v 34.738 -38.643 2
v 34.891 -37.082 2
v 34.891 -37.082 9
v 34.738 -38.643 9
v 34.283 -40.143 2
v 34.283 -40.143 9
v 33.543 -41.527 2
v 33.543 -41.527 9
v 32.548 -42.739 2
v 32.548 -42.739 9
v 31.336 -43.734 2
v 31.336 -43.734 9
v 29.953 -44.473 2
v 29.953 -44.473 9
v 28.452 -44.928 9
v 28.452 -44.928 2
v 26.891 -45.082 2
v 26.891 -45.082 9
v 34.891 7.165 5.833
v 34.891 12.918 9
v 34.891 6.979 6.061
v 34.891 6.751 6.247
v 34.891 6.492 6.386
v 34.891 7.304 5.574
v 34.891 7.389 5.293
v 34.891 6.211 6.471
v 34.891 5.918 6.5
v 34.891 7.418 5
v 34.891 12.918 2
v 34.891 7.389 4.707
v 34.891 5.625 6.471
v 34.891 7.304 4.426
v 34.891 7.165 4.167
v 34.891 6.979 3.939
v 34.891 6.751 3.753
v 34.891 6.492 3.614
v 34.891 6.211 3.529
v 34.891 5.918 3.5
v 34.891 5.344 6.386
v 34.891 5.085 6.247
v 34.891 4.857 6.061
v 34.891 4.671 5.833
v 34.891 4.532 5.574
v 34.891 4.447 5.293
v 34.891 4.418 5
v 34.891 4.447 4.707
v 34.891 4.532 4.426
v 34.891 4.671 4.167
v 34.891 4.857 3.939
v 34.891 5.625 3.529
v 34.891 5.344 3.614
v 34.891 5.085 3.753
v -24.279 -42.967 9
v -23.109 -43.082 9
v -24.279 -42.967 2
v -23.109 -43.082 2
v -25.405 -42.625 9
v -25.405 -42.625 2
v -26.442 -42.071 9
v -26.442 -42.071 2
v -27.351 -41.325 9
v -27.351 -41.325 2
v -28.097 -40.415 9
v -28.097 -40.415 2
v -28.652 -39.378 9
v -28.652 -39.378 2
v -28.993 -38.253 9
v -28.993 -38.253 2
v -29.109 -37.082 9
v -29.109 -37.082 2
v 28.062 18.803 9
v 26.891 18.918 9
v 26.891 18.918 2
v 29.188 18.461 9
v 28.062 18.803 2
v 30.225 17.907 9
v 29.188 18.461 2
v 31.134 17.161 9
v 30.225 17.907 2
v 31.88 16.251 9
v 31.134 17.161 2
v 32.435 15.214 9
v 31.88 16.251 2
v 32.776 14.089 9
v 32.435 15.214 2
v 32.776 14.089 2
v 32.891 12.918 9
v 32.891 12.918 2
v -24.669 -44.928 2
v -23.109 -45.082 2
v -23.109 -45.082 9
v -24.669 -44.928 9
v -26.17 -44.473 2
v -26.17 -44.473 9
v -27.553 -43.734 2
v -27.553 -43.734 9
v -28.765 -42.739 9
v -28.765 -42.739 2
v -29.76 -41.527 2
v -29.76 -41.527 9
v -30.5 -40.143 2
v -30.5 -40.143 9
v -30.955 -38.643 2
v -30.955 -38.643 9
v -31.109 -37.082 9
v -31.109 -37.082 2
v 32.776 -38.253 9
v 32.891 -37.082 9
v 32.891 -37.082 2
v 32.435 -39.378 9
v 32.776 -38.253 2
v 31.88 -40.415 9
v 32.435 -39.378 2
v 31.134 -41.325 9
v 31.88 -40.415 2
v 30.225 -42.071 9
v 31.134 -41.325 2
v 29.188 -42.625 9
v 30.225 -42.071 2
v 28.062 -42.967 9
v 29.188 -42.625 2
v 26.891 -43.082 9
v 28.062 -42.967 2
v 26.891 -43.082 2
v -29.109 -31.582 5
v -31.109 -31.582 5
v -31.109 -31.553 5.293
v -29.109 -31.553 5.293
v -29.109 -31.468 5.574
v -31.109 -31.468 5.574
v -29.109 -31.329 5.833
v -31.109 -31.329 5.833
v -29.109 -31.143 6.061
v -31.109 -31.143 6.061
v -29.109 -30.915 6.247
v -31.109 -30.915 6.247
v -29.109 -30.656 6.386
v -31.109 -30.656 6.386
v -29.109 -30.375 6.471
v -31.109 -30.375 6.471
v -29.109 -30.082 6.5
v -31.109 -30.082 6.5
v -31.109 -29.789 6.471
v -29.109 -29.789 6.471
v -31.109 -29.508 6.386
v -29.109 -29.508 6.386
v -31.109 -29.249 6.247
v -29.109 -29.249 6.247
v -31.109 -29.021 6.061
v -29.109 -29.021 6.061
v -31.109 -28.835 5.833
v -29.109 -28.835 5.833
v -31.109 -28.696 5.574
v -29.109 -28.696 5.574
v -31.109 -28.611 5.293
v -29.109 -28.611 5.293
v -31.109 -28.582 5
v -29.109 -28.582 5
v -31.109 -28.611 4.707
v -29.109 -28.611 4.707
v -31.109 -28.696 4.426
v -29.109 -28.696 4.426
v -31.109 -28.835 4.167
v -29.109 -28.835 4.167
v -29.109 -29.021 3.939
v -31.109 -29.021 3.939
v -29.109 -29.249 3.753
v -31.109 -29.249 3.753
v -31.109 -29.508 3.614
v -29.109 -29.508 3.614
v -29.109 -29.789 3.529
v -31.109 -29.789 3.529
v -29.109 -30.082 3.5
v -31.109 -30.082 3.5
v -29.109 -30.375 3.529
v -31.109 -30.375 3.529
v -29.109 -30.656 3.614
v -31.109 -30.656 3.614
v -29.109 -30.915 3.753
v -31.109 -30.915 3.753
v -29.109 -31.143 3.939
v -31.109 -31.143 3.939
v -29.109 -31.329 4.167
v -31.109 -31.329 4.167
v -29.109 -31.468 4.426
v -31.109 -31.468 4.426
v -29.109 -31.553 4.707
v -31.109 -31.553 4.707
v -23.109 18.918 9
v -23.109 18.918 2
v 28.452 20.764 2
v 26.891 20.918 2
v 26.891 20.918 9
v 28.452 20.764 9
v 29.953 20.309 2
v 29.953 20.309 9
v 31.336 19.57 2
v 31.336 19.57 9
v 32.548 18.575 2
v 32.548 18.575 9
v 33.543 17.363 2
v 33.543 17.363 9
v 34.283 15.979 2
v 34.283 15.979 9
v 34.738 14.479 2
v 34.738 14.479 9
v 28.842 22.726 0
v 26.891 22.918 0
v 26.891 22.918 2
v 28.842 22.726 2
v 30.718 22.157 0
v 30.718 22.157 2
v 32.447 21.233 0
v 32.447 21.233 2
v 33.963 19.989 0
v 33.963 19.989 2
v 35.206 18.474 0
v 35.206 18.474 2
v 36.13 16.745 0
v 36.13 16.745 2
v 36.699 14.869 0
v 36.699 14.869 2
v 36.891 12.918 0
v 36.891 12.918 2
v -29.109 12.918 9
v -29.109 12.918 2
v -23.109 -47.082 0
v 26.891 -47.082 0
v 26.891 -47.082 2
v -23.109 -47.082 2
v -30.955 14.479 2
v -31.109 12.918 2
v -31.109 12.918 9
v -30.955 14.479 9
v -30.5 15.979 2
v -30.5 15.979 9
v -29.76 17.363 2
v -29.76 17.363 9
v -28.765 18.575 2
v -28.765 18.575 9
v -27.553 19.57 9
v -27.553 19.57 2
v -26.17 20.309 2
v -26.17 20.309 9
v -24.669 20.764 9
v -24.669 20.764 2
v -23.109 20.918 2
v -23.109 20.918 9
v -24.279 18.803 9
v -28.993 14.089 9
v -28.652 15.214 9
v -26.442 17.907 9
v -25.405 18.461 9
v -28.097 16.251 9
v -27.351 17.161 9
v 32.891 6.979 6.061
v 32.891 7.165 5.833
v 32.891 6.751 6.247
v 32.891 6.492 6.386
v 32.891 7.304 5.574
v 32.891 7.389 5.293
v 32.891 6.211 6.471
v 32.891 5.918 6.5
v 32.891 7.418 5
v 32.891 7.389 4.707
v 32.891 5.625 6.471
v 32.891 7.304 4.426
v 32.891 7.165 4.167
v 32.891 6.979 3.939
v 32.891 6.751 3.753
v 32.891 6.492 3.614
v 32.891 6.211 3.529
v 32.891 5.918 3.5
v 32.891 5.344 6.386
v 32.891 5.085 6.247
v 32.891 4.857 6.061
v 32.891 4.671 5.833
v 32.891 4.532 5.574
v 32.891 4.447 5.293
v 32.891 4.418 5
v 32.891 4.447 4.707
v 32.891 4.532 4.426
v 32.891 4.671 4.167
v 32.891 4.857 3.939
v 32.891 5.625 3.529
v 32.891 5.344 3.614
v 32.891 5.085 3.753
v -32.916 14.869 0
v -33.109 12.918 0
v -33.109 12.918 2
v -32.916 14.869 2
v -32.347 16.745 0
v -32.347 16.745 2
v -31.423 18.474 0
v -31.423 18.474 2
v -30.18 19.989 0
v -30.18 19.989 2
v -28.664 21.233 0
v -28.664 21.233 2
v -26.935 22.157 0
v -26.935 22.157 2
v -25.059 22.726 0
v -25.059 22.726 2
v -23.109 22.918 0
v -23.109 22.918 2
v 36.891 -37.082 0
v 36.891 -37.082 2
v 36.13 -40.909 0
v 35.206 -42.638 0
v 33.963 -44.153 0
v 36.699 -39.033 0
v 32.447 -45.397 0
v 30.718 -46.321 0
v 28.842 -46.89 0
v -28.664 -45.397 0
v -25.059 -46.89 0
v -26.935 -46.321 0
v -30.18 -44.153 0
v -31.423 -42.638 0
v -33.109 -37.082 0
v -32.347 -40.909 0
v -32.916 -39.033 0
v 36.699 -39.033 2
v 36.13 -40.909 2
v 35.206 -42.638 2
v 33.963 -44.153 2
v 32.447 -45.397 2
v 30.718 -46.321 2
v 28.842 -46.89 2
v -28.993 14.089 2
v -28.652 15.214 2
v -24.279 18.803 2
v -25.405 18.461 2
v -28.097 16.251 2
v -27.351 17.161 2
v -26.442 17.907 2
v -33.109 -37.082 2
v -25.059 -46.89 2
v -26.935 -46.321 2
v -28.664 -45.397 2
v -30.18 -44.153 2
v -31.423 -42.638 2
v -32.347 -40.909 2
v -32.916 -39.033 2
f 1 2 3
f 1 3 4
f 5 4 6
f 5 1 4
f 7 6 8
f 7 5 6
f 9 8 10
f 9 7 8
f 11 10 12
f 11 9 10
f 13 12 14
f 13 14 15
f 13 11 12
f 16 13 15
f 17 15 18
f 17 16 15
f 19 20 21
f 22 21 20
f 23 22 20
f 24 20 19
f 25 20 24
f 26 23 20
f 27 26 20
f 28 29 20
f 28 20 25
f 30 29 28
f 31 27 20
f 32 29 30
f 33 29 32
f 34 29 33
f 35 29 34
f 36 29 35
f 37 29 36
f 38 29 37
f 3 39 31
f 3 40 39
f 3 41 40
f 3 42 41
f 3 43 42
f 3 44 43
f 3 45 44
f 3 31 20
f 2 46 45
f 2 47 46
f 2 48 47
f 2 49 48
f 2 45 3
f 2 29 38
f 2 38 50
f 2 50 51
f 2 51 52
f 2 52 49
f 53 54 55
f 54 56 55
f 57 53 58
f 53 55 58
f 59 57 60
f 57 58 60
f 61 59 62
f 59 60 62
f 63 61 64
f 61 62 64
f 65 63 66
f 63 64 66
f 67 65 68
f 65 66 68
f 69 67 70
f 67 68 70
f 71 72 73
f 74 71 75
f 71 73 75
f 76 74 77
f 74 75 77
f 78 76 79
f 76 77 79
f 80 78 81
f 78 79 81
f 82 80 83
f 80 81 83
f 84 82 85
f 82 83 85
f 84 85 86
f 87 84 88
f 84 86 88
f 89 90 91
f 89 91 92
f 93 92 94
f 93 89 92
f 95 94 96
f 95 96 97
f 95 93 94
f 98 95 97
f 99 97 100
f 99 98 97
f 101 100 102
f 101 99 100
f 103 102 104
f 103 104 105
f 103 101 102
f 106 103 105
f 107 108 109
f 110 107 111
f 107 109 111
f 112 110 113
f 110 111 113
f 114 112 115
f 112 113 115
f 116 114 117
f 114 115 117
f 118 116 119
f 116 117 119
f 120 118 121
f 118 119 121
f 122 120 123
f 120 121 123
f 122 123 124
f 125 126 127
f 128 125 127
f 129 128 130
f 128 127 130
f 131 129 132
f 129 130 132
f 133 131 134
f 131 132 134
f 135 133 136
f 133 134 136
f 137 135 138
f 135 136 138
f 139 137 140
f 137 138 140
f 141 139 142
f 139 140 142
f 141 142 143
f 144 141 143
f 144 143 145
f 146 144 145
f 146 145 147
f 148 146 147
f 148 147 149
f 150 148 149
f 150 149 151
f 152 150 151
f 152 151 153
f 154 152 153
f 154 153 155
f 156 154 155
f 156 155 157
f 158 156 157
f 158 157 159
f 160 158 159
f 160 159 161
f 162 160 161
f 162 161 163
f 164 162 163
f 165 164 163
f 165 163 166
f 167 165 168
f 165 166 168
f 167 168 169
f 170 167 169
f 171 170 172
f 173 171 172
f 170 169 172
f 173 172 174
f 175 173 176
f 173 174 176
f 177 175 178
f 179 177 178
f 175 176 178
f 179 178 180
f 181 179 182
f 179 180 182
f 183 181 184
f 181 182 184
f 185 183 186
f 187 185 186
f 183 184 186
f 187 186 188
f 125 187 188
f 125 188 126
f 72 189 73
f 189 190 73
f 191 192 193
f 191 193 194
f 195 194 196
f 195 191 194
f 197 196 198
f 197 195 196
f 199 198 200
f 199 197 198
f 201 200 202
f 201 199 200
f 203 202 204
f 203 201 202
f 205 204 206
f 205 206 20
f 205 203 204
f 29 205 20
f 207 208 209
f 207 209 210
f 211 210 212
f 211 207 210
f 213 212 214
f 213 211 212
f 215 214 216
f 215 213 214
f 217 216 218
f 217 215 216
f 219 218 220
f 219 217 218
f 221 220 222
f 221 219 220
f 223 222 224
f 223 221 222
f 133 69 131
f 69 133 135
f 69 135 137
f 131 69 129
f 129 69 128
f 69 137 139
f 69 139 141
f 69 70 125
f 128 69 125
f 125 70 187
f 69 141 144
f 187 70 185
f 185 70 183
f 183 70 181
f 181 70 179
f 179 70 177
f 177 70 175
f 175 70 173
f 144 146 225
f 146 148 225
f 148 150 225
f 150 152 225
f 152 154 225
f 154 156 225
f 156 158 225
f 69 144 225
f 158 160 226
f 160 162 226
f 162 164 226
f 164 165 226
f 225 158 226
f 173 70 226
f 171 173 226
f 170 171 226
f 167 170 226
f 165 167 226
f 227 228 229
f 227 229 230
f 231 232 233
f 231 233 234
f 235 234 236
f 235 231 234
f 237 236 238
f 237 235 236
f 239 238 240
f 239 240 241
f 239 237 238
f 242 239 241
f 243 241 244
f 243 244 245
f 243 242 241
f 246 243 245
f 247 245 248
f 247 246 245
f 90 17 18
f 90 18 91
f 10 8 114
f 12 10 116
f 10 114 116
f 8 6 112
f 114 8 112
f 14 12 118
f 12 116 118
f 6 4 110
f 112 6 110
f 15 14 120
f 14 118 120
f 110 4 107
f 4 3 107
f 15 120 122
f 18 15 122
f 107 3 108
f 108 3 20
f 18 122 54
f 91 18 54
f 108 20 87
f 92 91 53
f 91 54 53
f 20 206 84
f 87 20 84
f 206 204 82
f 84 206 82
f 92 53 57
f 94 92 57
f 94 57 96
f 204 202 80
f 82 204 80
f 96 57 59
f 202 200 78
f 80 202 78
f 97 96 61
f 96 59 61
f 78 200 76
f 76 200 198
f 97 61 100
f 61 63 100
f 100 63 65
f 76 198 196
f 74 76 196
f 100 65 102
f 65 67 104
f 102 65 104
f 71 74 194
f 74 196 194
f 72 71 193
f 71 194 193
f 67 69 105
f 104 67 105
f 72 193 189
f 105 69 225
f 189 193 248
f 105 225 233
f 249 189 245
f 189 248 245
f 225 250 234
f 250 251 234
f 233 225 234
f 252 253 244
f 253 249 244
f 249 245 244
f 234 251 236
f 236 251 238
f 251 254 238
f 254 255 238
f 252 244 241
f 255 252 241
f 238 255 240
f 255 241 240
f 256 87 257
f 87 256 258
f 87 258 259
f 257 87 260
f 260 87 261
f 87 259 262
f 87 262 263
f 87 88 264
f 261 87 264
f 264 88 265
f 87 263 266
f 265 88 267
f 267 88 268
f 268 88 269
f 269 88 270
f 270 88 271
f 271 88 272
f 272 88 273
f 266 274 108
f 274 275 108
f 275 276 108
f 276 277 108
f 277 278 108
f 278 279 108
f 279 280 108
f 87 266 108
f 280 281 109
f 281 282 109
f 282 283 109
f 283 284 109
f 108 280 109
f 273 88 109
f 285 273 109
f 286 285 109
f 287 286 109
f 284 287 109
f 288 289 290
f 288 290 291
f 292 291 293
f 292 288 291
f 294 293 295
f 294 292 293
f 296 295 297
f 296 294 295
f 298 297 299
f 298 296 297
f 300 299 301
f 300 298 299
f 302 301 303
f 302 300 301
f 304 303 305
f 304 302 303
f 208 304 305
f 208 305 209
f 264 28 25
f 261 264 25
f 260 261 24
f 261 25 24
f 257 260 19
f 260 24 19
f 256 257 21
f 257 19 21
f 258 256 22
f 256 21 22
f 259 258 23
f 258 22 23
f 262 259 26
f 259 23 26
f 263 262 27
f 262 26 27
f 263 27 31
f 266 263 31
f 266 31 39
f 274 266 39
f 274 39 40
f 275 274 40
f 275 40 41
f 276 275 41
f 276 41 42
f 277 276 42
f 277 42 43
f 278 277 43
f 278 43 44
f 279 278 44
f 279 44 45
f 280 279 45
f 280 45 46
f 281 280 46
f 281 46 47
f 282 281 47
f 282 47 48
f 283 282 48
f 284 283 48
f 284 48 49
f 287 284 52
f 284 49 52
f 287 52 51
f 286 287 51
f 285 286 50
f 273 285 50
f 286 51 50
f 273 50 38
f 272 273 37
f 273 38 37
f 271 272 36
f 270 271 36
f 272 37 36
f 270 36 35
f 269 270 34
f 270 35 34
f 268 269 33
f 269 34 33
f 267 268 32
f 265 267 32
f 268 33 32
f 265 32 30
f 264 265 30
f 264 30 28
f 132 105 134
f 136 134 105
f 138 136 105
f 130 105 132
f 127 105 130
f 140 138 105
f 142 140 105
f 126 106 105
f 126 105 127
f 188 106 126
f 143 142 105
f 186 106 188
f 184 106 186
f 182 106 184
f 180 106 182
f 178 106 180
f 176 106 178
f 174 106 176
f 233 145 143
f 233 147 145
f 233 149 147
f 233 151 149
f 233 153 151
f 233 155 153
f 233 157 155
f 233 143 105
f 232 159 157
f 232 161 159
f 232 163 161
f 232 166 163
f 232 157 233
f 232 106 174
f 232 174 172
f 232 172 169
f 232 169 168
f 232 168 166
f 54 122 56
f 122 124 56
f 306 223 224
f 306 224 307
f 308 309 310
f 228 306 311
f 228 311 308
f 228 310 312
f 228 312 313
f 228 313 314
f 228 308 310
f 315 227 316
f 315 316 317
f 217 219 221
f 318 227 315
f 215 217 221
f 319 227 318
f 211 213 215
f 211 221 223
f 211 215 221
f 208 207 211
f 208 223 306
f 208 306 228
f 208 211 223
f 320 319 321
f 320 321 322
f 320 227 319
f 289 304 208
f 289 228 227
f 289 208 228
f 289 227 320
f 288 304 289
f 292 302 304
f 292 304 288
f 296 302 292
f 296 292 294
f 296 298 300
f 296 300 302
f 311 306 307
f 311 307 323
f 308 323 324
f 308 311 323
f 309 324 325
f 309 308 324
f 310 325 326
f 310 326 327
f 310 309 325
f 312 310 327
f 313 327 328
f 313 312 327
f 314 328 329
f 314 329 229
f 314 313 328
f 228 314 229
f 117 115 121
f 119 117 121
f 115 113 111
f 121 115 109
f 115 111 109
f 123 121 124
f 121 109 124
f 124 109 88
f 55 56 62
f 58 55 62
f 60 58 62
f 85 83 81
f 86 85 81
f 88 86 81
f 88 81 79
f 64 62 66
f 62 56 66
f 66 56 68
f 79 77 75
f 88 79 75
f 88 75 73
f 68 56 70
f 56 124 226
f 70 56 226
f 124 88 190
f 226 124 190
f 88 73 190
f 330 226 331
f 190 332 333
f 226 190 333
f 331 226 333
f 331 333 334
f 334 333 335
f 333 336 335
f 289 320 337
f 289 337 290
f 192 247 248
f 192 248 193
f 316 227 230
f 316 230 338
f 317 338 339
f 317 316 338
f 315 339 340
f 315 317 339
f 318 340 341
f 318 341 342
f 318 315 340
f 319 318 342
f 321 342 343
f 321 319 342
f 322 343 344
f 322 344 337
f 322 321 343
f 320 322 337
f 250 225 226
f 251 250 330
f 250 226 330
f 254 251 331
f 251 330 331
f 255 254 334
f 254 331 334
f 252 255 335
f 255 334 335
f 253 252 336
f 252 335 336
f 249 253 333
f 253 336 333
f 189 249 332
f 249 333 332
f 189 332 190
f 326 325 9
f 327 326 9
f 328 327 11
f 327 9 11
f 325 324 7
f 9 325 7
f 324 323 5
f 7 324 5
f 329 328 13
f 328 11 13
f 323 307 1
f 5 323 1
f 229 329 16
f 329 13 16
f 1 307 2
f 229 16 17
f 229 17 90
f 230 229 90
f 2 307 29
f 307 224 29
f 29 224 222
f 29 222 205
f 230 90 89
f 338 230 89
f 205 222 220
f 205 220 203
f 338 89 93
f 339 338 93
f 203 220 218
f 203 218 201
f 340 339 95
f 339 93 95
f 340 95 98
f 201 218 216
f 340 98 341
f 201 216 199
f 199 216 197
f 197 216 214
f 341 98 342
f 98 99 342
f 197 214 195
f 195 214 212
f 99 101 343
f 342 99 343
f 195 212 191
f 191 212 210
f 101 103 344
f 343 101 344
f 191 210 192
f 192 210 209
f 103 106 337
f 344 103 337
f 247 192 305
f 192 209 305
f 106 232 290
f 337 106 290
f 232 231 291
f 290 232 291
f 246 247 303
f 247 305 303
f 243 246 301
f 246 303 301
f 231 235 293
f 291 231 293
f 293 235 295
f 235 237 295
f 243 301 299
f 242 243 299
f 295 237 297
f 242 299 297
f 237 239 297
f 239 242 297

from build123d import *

# Parameters (mm, degrees)
EXTRUDE_1_DEPTH     = 2
EXTRUDE_2_DEPTH     = 7
SHELL_1_T           = -2
SKETCH_3_R          = 1.5
CUT_EXTRUDE_1_DEPTH = 7
SKETCH_4_R          = 1.5
CUT_EXTRUDE_2_DEPTH = 7


with BuildPart() as part:
    # 草图1 → 凸台-拉伸1 (new body)
    with BuildSketch(Plane.XY):
        with BuildLine():
            Line((-23.108505897, 22.918009168), (26.891494103, 22.918009168))
            ThreePointArc((26.891494103, 22.918009168), (33.962561915, 19.989076979), (36.891494103, 12.918009168))
            Line((36.891494103, 12.918009168), (36.891494103, -37.081990832))
            ThreePointArc((36.891494103, -37.081990832), (33.962561915, -44.153058644), (26.891494103, -47.081990832))
            Line((26.891494103, -47.081990832), (-23.108505897, -47.081990832))
            ThreePointArc((-23.108505897, -47.081990832), (-30.179573709, -44.153058644), (-33.108505897, -37.081990832))
            Line((-33.108505897, -37.081990832), (-33.108505897, 12.918009168))
            ThreePointArc((-33.108505897, 12.918009168), (-30.179573709, 19.989076979), (-23.108505897, 22.918009168))
        make_face()
    extrude(amount=EXTRUDE_1_DEPTH)

    # 草图2 → 凸台-拉伸2 (add)
    with BuildSketch(Plane.XY.offset(2)):
        with BuildLine():
            Line((-23.108505897, 20.918009168), (26.891494103, 20.918009168))
            ThreePointArc((26.891494103, 20.918009168), (32.548348353, 18.574863417), (34.891494103, 12.918009168))
            Line((34.891494103, 12.918009168), (34.891494103, -37.081990832))
            ThreePointArc((34.891494103, -37.081990832), (32.548348353, -42.738845082), (26.891494103, -45.081990832))
            Line((26.891494103, -45.081990832), (-23.108505897, -45.081990832))
            ThreePointArc((-23.108505897, -45.081990832), (-28.765360146, -42.738845082), (-31.108505897, -37.081990832))
            Line((-31.108505897, -37.081990832), (-31.108505897, 12.918009168))
            ThreePointArc((-31.108505897, 12.918009168), (-28.765360146, 18.574863417), (-23.108505897, 20.918009168))
        make_face()
    extrude(amount=EXTRUDE_2_DEPTH)

    # 抽壳1
    shell_1_openings = [part.faces().sort_by_distance(p)[0] for p in [
        (1.891494103, -12.081990832, 9),
    ]]
    offset(amount=SHELL_1_T, openings=shell_1_openings, kind=Kind.INTERSECTION)

    # 草图3 → 切除-拉伸1 (cut)
    with BuildSketch(Plane.ZY.offset(31.108505897)):
        with Locations(Location((5, -30.081990832, 0), (0, 0, 270))):
            Circle(SKETCH_3_R)
    extrude(amount=-CUT_EXTRUDE_1_DEPTH, mode=Mode.SUBTRACT)

    # 草图4 → 切除-拉伸2 (cut)
    with BuildSketch(Plane(origin=(34.891494103, 0, 0), x_dir=(0, 0, -1), z_dir=(1, 0, 0))):
        with Locations(Location((-5, 5.918009168, 0), (0, 0, 90))):
            Circle(SKETCH_4_R)
    extrude(amount=-CUT_EXTRUDE_2_DEPTH, mode=Mode.SUBTRACT)


solid = part.part
